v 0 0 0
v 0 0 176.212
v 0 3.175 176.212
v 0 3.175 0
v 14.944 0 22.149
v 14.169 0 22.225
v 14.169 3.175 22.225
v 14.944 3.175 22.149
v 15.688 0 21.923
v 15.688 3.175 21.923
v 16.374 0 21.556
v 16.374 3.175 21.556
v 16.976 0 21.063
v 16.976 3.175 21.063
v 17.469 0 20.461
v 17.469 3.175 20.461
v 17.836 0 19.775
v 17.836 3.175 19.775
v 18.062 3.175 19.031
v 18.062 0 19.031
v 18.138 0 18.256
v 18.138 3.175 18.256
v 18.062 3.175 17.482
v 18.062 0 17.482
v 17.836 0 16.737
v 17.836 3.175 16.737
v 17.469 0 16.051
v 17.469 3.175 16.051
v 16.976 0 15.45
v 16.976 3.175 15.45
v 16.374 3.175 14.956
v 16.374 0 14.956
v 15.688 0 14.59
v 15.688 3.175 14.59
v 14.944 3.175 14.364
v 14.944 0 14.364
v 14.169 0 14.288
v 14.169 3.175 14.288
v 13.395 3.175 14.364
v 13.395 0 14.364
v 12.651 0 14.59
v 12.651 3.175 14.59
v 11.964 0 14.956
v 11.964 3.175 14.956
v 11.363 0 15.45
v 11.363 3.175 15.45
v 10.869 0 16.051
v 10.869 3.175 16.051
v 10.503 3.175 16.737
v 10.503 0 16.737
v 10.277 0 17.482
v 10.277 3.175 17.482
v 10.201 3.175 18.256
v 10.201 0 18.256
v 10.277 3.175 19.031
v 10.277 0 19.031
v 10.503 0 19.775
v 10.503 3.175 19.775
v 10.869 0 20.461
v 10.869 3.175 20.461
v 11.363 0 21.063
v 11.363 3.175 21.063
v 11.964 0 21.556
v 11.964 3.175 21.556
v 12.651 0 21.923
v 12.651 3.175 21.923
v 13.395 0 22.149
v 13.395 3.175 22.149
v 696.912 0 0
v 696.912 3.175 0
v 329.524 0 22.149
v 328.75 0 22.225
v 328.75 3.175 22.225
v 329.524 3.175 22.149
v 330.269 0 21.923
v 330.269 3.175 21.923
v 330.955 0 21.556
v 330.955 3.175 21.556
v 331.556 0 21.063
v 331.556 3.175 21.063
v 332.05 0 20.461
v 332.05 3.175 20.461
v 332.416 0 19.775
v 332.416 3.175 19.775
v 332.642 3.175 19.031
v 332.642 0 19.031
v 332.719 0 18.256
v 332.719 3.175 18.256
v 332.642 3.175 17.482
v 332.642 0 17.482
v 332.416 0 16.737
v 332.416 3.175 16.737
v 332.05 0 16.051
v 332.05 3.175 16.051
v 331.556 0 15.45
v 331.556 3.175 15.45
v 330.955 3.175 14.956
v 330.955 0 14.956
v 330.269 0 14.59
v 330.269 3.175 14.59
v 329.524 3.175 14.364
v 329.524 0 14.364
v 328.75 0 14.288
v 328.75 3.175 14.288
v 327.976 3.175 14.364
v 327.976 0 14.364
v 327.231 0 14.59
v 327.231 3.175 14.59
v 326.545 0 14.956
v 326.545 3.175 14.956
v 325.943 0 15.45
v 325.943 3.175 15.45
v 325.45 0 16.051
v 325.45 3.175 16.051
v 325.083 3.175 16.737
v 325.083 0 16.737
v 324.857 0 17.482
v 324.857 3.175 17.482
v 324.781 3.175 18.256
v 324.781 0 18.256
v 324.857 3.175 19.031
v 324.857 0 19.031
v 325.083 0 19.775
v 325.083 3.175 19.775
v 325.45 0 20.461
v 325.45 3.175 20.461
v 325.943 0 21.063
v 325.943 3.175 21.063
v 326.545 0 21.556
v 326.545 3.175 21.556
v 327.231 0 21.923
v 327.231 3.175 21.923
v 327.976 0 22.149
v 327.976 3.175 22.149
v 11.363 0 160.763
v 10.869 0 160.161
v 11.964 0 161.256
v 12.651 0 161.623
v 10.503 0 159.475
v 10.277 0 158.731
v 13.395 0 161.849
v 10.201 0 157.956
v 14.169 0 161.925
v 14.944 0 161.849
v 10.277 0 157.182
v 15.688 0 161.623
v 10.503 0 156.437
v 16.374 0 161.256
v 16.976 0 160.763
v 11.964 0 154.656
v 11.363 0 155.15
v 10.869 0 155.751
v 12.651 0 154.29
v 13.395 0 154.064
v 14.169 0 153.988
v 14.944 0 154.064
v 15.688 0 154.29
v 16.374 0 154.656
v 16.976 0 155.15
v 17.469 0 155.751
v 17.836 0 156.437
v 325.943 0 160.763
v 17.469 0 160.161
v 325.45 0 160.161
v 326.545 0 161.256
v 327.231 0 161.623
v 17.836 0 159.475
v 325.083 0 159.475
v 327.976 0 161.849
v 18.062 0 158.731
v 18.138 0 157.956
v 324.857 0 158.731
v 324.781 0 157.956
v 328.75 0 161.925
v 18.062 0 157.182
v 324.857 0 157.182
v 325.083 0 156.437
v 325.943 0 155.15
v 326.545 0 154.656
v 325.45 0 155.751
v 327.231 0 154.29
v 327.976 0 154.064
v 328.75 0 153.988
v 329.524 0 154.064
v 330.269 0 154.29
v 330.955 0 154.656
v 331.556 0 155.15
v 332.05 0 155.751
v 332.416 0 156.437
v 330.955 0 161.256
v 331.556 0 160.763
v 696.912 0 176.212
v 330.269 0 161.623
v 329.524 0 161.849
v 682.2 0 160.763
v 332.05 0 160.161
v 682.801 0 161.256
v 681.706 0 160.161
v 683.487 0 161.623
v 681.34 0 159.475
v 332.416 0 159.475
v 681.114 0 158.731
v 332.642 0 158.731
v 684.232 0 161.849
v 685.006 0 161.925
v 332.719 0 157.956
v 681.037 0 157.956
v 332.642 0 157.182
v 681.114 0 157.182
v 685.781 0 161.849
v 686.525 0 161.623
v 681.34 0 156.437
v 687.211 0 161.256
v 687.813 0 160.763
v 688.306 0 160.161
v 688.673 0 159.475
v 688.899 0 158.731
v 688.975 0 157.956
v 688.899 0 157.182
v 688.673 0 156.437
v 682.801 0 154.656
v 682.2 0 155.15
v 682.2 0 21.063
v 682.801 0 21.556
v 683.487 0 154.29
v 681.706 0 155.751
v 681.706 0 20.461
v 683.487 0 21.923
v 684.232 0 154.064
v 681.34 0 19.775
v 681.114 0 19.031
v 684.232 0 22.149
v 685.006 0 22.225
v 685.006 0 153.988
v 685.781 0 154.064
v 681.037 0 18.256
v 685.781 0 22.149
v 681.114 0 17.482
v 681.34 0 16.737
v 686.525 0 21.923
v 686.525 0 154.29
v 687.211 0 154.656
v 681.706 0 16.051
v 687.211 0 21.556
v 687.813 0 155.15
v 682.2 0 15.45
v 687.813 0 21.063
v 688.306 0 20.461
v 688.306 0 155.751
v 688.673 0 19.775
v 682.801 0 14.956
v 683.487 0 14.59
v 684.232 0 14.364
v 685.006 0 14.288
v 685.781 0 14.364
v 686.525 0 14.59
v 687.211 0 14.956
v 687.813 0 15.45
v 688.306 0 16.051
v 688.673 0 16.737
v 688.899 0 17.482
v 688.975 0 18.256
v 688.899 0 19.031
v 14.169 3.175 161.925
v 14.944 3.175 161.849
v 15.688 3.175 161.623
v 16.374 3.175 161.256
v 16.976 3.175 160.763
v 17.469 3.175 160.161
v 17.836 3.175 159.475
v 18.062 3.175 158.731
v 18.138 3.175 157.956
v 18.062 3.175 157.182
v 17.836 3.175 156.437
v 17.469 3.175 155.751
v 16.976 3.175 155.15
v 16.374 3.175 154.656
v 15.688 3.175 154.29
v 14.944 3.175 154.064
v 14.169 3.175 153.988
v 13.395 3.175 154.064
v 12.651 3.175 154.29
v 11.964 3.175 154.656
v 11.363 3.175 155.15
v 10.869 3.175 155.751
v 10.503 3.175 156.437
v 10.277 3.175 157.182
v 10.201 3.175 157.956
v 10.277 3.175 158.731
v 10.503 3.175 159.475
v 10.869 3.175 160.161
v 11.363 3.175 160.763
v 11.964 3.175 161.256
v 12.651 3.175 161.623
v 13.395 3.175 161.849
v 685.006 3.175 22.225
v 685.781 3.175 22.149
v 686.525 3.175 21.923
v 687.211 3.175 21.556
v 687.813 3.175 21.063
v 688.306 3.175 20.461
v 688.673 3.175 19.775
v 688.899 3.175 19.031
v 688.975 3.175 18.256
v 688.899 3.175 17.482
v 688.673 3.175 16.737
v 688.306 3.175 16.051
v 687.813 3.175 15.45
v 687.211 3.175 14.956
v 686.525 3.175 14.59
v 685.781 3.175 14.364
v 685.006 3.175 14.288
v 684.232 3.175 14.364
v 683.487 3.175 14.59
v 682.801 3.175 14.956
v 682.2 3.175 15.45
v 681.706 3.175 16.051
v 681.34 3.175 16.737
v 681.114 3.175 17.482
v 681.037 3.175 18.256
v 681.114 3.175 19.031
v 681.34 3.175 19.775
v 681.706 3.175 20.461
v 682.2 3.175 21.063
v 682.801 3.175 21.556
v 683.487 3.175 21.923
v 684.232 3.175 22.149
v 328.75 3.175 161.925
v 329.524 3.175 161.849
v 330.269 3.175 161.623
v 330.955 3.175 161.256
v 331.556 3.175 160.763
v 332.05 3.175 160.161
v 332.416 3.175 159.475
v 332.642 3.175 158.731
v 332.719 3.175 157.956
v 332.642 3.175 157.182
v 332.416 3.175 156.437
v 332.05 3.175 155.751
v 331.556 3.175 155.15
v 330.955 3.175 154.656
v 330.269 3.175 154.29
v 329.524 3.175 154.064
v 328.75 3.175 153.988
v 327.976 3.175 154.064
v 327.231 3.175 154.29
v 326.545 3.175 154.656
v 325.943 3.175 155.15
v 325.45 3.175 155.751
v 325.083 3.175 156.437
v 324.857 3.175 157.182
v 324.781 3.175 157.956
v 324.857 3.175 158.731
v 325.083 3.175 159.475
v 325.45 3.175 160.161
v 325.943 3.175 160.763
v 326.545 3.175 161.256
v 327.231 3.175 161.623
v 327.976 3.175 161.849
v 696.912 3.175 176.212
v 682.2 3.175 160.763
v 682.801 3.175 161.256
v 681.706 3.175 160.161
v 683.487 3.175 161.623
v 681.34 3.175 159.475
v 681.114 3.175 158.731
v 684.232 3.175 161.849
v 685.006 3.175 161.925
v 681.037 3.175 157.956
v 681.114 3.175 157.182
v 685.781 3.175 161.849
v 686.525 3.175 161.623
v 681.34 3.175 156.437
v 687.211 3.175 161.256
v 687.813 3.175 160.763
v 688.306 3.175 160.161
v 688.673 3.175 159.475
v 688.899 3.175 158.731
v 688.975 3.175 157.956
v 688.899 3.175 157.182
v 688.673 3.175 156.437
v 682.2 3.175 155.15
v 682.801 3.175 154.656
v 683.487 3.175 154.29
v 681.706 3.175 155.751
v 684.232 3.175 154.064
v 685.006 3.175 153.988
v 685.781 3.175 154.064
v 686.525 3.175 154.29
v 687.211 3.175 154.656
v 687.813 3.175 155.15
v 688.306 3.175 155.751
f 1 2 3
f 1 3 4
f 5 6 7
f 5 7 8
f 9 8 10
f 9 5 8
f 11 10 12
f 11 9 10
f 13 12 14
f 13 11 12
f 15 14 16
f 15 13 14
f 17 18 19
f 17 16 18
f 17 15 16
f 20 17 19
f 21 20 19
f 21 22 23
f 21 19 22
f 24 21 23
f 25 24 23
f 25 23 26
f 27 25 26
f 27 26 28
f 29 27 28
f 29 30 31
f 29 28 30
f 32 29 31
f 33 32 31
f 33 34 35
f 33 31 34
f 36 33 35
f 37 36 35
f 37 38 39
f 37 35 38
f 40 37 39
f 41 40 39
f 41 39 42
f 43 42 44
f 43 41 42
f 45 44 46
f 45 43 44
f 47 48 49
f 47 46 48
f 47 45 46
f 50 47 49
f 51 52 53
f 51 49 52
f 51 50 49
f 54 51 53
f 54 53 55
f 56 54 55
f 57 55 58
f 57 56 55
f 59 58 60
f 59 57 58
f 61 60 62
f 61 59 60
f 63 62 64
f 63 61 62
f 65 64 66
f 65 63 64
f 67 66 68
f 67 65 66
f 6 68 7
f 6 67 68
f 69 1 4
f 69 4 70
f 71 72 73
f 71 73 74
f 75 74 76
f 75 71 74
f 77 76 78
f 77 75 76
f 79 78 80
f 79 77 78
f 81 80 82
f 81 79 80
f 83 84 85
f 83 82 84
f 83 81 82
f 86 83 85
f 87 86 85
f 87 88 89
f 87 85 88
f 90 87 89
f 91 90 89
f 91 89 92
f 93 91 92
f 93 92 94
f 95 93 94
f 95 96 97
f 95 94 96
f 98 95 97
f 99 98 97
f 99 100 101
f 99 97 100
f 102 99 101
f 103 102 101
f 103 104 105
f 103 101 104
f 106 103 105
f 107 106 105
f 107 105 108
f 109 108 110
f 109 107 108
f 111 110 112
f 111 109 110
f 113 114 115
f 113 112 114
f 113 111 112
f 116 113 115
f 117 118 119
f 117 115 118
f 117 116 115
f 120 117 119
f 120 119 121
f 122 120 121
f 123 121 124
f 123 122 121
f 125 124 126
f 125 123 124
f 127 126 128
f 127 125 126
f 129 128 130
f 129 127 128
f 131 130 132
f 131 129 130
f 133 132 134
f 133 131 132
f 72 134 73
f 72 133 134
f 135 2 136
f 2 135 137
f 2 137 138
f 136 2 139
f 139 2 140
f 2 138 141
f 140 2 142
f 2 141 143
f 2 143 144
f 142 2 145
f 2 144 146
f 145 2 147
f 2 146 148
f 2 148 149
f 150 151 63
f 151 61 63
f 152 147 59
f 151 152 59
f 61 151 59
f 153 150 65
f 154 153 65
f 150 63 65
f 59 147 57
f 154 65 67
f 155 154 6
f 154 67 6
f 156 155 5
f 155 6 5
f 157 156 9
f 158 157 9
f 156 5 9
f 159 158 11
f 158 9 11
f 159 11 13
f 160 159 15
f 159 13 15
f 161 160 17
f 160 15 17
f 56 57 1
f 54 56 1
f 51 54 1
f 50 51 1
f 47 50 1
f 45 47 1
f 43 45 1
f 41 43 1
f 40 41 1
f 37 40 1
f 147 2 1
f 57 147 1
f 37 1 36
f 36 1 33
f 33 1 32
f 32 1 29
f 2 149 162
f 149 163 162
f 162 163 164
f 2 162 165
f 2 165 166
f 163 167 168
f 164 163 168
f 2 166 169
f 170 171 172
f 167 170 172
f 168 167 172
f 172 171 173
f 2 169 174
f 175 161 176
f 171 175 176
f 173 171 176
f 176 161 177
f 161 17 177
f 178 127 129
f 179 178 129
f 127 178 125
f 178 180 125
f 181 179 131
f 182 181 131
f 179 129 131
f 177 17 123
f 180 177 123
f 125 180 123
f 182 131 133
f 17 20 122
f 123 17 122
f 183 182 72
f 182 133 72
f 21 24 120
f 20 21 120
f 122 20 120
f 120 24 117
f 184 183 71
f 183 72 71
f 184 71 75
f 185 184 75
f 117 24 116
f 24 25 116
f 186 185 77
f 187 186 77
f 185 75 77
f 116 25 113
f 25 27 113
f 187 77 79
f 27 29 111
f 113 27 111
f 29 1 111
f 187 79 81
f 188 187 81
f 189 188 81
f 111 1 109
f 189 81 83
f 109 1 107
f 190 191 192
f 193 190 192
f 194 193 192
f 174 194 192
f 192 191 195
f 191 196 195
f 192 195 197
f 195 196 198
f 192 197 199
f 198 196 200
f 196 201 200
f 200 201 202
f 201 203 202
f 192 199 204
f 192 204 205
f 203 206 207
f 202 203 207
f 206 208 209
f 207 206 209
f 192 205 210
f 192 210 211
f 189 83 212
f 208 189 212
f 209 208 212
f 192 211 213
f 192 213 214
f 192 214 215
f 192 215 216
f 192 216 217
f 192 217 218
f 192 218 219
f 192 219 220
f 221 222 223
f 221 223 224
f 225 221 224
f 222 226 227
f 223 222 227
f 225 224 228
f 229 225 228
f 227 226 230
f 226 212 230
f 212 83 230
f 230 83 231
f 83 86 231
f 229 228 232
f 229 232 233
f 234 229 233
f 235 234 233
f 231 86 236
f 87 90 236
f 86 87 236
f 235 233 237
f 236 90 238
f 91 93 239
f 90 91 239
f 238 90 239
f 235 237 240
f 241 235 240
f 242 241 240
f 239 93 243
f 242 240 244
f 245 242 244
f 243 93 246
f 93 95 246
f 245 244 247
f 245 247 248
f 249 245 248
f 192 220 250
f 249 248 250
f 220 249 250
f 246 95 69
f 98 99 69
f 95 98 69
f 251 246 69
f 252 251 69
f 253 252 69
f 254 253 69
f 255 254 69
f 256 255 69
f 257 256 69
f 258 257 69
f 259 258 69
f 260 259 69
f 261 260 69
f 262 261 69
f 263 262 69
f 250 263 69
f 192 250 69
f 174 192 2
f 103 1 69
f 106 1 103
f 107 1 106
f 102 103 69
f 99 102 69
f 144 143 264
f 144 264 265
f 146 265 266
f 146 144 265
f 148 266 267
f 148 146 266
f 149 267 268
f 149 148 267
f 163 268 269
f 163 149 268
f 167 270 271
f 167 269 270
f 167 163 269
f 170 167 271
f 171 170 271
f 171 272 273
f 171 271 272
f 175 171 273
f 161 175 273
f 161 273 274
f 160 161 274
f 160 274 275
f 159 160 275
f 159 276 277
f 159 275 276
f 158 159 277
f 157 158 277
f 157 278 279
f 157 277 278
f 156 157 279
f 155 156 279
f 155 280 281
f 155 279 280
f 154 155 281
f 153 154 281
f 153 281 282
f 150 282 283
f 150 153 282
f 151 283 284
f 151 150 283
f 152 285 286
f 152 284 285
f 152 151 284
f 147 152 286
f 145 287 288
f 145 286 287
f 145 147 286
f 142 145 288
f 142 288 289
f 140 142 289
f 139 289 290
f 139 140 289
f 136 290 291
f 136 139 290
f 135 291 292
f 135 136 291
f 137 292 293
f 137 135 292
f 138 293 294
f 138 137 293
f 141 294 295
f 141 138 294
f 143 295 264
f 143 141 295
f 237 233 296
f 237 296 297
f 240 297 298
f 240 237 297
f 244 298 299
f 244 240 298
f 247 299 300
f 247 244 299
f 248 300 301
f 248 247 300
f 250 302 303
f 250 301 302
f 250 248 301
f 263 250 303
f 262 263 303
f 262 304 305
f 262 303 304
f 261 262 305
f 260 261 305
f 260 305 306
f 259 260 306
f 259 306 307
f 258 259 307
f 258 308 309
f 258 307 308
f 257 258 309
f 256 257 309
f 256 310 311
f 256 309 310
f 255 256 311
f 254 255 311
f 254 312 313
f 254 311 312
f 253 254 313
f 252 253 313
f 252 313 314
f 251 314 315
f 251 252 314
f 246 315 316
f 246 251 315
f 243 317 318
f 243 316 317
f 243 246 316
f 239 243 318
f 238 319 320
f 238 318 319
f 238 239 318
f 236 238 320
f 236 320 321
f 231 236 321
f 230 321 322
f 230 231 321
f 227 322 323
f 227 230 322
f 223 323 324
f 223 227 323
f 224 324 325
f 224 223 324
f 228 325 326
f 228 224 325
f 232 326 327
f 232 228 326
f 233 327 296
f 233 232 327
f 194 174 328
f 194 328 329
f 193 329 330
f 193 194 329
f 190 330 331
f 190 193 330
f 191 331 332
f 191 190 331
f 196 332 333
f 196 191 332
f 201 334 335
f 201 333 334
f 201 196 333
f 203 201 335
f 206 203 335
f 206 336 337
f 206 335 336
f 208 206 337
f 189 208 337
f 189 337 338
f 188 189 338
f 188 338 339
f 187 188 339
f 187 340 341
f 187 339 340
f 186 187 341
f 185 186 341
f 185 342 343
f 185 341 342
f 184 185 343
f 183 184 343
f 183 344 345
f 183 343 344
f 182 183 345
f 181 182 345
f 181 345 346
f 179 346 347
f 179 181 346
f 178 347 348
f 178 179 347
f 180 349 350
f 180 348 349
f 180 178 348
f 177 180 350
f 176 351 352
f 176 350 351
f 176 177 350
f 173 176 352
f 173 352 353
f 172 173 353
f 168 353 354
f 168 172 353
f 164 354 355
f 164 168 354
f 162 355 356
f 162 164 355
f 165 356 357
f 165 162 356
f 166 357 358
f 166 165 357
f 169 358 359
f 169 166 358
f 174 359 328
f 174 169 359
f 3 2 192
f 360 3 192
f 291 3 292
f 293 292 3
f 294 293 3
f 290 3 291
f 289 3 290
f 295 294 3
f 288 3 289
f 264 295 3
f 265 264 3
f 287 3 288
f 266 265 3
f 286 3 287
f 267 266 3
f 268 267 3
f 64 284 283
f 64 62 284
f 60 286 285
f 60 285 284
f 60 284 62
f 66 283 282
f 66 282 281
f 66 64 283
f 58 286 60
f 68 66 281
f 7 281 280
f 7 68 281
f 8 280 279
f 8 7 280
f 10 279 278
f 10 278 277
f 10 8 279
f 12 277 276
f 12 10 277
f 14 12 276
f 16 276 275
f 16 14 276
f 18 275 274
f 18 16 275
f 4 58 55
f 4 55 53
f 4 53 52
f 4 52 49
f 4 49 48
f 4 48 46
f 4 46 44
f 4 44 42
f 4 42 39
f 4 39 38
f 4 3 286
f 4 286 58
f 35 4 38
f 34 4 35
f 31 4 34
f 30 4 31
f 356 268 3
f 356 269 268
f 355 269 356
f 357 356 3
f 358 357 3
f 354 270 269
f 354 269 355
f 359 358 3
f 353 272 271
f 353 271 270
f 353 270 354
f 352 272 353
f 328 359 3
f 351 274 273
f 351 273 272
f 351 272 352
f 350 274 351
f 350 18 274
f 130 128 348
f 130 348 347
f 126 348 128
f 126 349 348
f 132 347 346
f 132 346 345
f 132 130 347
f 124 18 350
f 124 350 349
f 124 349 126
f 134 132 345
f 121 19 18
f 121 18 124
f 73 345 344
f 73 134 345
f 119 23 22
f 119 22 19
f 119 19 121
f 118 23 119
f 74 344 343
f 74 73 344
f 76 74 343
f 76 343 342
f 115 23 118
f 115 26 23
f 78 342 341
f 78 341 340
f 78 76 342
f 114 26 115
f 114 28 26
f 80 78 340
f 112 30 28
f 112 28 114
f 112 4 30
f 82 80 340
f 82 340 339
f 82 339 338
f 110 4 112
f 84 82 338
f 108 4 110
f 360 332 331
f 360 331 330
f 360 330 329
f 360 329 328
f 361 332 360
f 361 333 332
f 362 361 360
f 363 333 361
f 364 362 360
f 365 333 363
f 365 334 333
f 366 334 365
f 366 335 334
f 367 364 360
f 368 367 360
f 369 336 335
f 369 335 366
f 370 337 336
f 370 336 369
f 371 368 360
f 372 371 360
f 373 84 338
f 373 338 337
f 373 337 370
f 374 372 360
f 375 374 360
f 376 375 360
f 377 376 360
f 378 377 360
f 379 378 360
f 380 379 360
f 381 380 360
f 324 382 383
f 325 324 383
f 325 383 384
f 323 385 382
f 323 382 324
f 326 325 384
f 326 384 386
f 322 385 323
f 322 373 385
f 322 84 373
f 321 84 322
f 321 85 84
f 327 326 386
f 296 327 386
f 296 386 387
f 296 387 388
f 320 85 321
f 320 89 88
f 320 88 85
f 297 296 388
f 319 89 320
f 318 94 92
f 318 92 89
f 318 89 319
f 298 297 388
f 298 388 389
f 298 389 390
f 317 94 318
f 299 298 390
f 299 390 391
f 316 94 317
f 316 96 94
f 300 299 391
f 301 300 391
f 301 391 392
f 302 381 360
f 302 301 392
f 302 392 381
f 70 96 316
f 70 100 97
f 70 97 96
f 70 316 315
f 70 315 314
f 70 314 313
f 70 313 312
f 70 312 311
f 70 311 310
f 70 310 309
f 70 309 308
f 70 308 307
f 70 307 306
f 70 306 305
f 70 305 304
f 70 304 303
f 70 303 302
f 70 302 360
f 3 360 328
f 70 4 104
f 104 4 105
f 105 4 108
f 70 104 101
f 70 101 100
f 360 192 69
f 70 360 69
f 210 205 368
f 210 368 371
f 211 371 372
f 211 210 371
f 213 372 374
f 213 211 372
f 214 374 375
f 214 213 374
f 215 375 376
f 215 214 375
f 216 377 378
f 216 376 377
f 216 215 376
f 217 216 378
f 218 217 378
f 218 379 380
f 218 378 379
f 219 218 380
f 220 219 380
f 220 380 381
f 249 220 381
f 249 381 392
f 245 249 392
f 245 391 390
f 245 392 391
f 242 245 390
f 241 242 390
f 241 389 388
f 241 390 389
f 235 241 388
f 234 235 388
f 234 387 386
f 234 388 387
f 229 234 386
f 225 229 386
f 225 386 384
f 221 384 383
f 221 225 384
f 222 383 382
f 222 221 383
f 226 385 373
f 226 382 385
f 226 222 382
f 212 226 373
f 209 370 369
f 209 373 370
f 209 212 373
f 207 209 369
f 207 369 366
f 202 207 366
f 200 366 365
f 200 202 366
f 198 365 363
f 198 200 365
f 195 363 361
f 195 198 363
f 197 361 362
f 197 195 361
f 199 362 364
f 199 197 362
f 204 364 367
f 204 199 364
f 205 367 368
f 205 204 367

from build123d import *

# Parameters (mm, degrees)
SKETCH1_W               = 696.9125
SKETCH1_H               = 176.2125
BOSS_EXTRUDE1_DEPTH     = 3.175
CUT_EXTRUDE1_DEPTH      = 384.558251102
CUT_EXTRUDE1_DEPTH_BACK = 384.558251102
SKETCH2_R               = 3.96875


with BuildPart() as part:
    # Sketch1 → Boss-Extrude1 (new body)
    with BuildSketch(Plane(origin=(0, 0, 0), x_dir=(1, 0, 0), z_dir=(0, 1, 0))):
        with Locations((348.45625, -88.10625)):
            Rectangle(SKETCH1_W, SKETCH1_H)
    extrude(amount=BOSS_EXTRUDE1_DEPTH)

    # Sketch2 → Cut-Extrude1 (cut, two sides: drawn at the far end of the back side and taken through both)
    with BuildSketch(Plane(origin=(324.841503281, 3.175, 83.099532245), x_dir=(1, 0, 0), z_dir=(0, 1, 0)).offset(-CUT_EXTRUDE1_DEPTH_BACK)):
        with Locations(Location((360.164746719, 64.843282245, 0), (0, 0, 270))):
            Circle(SKETCH2_R)
        with Locations(Location((360.164746719, -74.856717755, 0), (0, 0, 270))):
            Circle(SKETCH2_R)
        with Locations(Location((3.908296933, 64.843282245, 0), (0, 0, 270))):
            Circle(SKETCH2_R)
        with Locations(Location((-310.672178196, 64.843282245, 0), (0, 0, 270))):
            Circle(SKETCH2_R)
        with Locations(Location((3.908296933, -74.856717755, 0), (0, 0, 270))):
            Circle(SKETCH2_R)
        with Locations(Location((-310.672178196, -74.856717755, 0), (0, 0, 270))):
            Circle(SKETCH2_R)
    extrude(amount=CUT_EXTRUDE1_DEPTH + CUT_EXTRUDE1_DEPTH_BACK, mode=Mode.SUBTRACT)


solid = part.part
